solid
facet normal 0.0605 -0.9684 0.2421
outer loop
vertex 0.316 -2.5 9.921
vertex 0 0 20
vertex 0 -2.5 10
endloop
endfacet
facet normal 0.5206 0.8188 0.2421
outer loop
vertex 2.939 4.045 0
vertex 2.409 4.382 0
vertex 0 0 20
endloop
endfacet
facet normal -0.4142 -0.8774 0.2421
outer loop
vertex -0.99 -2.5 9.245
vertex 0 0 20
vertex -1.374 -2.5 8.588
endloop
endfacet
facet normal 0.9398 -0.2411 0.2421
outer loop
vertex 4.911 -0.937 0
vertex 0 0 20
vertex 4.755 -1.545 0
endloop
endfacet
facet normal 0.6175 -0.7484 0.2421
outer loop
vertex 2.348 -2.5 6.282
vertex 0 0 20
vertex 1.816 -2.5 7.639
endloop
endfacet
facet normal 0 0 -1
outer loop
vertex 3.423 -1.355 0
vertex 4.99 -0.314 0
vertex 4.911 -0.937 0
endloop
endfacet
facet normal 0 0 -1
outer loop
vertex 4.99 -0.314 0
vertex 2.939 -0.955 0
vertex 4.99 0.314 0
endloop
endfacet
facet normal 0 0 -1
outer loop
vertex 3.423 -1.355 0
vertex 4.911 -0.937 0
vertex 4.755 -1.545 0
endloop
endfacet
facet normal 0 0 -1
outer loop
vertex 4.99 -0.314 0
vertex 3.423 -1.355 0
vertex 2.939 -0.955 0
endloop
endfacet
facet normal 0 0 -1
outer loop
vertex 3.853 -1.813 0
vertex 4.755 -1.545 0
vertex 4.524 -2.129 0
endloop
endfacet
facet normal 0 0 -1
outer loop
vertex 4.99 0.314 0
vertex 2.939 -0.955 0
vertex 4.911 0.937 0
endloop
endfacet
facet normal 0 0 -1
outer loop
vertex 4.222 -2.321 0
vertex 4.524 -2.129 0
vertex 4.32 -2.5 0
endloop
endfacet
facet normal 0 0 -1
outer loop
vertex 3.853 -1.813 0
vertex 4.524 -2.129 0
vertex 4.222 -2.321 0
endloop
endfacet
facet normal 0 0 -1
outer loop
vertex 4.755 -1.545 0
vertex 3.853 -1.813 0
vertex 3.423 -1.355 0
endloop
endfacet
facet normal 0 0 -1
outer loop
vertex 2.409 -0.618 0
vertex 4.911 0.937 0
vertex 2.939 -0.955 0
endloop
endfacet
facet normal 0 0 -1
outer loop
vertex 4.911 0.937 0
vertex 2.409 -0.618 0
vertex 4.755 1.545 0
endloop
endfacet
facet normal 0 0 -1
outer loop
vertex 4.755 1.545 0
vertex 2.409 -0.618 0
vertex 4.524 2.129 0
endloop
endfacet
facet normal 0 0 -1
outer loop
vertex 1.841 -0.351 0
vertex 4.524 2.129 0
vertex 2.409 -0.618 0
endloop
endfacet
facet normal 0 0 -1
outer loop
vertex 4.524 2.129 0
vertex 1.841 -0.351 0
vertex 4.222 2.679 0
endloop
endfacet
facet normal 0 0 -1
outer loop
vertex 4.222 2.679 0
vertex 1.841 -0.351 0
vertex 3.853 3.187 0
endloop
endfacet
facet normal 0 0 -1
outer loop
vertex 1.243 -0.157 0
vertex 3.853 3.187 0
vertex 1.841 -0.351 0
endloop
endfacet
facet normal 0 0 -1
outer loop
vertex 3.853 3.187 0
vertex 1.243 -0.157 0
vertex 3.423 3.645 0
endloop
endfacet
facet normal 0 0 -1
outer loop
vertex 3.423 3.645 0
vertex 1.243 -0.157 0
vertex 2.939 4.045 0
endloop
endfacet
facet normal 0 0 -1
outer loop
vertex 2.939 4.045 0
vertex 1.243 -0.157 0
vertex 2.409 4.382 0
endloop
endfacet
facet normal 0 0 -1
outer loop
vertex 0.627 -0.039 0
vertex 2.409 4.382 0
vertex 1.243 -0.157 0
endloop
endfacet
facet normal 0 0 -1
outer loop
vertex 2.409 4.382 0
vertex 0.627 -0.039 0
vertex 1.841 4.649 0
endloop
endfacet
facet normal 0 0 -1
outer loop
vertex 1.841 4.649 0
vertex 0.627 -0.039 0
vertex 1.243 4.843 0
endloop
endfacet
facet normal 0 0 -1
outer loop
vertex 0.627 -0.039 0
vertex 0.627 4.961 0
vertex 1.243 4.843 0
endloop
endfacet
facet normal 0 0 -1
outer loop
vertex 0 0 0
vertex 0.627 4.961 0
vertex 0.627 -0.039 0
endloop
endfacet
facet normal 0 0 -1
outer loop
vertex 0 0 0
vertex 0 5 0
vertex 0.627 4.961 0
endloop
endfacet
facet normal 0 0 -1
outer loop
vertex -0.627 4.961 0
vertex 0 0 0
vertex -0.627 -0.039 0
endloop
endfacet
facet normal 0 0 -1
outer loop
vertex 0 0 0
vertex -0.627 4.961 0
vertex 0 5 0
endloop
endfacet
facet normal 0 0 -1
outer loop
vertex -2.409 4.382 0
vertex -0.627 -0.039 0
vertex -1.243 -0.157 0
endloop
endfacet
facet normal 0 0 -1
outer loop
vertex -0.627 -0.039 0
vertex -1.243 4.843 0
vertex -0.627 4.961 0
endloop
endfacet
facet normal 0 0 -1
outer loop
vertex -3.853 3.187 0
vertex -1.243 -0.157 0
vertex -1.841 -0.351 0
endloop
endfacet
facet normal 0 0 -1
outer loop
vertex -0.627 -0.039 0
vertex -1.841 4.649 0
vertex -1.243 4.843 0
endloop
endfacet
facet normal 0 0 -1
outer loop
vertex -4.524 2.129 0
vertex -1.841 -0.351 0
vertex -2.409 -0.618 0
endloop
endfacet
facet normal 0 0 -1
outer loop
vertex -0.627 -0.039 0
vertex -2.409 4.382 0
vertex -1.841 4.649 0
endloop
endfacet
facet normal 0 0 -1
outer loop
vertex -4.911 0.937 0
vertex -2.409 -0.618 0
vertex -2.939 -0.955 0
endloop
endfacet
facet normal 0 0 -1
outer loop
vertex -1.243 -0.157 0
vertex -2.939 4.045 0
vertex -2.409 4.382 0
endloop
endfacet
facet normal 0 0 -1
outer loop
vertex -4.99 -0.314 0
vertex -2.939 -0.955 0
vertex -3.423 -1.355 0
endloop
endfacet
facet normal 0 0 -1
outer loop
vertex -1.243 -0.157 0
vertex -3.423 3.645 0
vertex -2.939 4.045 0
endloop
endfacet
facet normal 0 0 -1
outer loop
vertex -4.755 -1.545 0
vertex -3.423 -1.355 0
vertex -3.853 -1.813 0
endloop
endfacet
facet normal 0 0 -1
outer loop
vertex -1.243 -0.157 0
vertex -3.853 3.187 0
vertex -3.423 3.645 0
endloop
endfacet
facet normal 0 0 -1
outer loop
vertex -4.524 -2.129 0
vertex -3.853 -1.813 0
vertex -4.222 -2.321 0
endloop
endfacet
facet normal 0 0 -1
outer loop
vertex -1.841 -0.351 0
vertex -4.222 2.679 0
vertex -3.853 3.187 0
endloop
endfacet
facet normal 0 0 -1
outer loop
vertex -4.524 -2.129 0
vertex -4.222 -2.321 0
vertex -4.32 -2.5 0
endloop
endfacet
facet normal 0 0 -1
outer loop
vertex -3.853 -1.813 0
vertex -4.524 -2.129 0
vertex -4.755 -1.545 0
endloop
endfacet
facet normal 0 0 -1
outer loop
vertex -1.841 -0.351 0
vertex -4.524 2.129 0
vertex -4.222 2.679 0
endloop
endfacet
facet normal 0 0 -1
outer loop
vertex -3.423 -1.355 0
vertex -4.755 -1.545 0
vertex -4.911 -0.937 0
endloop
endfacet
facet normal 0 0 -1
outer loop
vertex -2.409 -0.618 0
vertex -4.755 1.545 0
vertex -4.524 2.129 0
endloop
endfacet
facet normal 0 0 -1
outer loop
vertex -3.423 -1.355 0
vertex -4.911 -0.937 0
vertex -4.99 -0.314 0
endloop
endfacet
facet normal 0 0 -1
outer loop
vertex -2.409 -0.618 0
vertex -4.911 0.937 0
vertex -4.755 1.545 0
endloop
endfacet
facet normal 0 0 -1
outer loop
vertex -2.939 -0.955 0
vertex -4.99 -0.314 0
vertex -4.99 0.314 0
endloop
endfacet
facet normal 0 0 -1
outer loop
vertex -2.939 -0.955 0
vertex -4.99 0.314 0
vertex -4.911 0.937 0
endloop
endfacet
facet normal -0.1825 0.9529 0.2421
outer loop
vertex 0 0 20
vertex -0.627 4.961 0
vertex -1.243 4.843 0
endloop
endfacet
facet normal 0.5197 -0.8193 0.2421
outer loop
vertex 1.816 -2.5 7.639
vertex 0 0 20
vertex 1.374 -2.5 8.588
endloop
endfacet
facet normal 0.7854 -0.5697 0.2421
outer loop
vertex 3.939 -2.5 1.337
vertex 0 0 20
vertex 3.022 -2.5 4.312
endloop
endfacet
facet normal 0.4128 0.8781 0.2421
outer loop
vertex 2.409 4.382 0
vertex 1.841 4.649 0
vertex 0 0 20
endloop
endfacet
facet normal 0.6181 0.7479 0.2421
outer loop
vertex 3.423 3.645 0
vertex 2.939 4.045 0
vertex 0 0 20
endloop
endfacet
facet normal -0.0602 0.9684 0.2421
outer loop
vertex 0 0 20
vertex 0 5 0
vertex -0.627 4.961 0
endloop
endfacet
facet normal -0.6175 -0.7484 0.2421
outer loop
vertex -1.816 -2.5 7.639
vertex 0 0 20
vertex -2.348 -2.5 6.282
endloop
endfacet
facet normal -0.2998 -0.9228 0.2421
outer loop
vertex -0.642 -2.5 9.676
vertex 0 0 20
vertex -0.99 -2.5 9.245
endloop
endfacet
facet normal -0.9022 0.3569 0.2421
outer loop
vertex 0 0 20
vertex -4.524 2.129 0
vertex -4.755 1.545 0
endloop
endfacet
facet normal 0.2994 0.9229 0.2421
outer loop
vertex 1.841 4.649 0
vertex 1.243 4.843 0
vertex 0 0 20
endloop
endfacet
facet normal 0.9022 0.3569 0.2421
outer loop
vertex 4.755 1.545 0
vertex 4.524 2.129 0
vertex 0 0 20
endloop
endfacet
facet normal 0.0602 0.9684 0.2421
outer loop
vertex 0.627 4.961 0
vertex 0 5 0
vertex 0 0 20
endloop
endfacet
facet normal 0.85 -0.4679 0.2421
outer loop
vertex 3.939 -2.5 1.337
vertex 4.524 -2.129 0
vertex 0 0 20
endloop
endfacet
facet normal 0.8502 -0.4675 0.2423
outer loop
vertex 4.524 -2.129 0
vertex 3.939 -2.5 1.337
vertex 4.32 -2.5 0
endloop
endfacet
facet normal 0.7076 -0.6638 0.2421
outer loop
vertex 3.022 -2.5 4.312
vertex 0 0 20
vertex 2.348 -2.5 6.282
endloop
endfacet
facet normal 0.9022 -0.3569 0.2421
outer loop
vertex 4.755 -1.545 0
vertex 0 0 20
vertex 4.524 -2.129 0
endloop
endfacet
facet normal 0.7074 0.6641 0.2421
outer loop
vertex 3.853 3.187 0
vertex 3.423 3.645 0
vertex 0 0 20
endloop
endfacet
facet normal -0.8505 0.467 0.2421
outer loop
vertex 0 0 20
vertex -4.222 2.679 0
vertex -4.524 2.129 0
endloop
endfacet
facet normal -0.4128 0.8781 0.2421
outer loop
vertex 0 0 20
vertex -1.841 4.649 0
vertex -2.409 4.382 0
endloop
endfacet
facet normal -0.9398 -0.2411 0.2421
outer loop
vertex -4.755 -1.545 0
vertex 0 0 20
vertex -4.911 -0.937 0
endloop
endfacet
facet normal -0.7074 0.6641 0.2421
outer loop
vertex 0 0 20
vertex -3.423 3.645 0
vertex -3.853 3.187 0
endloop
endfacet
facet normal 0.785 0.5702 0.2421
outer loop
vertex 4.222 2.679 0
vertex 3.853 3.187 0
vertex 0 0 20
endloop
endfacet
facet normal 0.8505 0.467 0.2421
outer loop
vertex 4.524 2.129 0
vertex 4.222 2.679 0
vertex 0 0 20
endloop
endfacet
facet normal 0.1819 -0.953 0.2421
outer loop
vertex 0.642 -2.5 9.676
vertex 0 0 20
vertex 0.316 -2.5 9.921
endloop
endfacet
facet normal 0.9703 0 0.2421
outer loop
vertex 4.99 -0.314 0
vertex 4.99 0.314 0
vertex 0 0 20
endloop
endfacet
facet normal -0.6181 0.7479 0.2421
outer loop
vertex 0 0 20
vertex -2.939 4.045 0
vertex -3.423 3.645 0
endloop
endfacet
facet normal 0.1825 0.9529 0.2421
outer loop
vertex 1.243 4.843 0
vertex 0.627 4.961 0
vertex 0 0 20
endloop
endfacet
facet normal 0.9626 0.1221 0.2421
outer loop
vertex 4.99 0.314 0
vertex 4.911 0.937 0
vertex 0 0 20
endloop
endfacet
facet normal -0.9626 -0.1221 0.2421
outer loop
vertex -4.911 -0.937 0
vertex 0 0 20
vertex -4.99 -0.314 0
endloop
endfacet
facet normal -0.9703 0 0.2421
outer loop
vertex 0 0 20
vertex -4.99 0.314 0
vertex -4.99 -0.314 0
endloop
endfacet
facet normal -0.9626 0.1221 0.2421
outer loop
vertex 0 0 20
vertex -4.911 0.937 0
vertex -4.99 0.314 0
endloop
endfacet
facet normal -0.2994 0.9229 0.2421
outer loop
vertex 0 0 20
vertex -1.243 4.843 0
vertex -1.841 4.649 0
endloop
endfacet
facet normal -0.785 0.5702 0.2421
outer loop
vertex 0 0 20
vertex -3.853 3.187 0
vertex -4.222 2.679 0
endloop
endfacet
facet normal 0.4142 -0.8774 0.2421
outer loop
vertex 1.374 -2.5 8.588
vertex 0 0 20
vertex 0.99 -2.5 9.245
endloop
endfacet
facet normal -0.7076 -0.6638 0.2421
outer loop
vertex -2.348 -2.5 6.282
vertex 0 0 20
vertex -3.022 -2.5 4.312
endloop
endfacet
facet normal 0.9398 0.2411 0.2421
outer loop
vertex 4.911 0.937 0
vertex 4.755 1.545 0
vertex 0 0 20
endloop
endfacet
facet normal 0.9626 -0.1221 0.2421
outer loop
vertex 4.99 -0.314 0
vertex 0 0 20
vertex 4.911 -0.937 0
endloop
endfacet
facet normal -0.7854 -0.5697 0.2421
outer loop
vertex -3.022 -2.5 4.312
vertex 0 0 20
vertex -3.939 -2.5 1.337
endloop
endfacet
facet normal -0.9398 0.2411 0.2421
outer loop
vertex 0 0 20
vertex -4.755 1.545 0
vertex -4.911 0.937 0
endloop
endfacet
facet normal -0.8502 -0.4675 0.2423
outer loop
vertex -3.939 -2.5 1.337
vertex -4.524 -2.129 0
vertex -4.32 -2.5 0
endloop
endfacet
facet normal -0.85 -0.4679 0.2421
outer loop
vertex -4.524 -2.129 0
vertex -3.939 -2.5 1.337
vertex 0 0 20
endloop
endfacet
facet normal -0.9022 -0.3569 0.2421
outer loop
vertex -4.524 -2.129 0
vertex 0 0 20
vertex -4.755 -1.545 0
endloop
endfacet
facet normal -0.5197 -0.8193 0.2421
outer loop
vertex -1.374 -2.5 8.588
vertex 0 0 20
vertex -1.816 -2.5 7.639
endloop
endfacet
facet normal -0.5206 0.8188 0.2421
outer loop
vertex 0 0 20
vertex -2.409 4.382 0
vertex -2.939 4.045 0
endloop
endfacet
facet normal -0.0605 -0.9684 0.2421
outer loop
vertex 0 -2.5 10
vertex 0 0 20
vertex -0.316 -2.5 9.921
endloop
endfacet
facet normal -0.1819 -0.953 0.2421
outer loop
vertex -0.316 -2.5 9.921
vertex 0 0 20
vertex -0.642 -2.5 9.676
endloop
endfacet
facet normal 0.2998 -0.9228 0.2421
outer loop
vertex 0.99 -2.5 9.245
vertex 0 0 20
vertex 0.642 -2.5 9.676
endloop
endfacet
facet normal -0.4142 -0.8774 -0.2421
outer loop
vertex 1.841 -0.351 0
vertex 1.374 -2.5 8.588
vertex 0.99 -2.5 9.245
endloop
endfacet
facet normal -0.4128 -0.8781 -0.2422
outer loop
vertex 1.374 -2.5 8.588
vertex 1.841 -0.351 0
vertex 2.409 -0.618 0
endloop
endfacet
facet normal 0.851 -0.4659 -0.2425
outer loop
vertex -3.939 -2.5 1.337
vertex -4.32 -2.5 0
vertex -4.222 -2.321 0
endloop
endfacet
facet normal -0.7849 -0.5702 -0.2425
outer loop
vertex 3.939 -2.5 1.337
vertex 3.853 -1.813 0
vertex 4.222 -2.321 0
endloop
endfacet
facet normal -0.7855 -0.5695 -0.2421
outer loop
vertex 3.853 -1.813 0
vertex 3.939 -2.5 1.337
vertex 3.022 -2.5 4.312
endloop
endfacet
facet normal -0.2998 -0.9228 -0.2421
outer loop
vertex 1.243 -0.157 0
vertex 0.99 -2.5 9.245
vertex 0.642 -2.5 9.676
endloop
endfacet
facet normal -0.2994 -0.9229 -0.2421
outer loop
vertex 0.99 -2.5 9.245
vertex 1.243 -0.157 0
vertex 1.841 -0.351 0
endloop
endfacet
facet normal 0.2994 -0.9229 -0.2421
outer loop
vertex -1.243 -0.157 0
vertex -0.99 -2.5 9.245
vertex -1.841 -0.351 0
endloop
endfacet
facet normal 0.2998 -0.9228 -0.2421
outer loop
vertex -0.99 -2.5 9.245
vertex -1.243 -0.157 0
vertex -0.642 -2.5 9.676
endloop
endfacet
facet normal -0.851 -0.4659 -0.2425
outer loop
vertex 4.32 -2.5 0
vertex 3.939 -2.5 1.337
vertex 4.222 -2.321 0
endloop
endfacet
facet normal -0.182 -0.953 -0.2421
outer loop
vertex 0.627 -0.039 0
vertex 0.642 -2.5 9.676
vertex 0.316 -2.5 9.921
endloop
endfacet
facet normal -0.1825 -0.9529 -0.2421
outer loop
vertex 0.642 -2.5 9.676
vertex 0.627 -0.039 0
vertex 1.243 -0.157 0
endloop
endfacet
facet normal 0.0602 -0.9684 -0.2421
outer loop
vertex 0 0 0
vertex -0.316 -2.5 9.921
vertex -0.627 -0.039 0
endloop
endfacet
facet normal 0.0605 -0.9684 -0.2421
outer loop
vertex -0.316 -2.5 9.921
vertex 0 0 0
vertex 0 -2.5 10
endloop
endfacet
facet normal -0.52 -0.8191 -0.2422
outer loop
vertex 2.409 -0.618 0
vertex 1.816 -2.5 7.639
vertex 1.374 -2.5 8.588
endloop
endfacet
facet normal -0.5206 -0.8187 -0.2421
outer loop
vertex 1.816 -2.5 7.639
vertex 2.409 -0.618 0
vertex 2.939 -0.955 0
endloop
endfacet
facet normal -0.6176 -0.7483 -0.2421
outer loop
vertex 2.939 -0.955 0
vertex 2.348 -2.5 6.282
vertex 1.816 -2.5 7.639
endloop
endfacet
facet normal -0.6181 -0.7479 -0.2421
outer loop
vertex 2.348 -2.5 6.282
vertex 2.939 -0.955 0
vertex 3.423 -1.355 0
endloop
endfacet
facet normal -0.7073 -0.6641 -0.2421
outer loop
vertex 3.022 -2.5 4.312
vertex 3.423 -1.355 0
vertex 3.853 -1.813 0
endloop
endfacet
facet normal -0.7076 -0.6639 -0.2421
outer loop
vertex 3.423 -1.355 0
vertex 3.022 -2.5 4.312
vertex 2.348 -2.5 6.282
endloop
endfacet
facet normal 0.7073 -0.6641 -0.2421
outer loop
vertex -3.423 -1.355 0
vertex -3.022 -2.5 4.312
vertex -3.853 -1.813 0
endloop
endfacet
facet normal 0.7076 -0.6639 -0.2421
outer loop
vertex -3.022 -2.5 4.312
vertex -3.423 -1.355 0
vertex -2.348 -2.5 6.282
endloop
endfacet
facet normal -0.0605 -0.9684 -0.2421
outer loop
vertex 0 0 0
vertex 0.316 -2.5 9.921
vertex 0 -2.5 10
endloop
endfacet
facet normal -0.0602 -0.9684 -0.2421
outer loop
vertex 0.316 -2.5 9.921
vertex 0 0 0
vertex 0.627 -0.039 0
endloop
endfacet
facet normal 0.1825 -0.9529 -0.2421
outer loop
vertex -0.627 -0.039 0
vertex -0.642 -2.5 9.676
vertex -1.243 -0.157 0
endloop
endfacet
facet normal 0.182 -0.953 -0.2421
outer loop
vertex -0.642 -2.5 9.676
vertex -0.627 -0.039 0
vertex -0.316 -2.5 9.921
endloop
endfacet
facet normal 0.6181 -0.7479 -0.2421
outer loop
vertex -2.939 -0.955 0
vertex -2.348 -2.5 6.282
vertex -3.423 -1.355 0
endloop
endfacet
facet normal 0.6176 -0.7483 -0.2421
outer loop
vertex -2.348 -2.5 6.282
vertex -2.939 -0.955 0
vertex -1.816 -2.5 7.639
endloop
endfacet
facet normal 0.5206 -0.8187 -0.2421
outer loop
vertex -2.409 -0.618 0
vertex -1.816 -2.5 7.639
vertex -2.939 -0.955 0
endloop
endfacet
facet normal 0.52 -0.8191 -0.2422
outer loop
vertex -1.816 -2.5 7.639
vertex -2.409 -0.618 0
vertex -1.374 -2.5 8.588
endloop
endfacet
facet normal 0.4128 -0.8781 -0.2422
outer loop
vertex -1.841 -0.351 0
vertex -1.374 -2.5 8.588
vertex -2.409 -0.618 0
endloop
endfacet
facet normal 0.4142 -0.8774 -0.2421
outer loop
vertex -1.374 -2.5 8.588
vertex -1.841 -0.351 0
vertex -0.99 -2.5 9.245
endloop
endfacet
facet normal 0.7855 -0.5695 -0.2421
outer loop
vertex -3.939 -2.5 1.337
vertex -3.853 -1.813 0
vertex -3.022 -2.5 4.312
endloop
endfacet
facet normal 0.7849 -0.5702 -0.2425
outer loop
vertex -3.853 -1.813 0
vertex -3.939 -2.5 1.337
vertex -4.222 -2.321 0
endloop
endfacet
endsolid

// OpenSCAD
$fn=50;
rotate([0, 0, -90]) difference() {
    cylinder(h=20, r1=5, r2=0);
    translate([5, 0, 0]) cylinder(h=20, r1=5, r2=0);
}
